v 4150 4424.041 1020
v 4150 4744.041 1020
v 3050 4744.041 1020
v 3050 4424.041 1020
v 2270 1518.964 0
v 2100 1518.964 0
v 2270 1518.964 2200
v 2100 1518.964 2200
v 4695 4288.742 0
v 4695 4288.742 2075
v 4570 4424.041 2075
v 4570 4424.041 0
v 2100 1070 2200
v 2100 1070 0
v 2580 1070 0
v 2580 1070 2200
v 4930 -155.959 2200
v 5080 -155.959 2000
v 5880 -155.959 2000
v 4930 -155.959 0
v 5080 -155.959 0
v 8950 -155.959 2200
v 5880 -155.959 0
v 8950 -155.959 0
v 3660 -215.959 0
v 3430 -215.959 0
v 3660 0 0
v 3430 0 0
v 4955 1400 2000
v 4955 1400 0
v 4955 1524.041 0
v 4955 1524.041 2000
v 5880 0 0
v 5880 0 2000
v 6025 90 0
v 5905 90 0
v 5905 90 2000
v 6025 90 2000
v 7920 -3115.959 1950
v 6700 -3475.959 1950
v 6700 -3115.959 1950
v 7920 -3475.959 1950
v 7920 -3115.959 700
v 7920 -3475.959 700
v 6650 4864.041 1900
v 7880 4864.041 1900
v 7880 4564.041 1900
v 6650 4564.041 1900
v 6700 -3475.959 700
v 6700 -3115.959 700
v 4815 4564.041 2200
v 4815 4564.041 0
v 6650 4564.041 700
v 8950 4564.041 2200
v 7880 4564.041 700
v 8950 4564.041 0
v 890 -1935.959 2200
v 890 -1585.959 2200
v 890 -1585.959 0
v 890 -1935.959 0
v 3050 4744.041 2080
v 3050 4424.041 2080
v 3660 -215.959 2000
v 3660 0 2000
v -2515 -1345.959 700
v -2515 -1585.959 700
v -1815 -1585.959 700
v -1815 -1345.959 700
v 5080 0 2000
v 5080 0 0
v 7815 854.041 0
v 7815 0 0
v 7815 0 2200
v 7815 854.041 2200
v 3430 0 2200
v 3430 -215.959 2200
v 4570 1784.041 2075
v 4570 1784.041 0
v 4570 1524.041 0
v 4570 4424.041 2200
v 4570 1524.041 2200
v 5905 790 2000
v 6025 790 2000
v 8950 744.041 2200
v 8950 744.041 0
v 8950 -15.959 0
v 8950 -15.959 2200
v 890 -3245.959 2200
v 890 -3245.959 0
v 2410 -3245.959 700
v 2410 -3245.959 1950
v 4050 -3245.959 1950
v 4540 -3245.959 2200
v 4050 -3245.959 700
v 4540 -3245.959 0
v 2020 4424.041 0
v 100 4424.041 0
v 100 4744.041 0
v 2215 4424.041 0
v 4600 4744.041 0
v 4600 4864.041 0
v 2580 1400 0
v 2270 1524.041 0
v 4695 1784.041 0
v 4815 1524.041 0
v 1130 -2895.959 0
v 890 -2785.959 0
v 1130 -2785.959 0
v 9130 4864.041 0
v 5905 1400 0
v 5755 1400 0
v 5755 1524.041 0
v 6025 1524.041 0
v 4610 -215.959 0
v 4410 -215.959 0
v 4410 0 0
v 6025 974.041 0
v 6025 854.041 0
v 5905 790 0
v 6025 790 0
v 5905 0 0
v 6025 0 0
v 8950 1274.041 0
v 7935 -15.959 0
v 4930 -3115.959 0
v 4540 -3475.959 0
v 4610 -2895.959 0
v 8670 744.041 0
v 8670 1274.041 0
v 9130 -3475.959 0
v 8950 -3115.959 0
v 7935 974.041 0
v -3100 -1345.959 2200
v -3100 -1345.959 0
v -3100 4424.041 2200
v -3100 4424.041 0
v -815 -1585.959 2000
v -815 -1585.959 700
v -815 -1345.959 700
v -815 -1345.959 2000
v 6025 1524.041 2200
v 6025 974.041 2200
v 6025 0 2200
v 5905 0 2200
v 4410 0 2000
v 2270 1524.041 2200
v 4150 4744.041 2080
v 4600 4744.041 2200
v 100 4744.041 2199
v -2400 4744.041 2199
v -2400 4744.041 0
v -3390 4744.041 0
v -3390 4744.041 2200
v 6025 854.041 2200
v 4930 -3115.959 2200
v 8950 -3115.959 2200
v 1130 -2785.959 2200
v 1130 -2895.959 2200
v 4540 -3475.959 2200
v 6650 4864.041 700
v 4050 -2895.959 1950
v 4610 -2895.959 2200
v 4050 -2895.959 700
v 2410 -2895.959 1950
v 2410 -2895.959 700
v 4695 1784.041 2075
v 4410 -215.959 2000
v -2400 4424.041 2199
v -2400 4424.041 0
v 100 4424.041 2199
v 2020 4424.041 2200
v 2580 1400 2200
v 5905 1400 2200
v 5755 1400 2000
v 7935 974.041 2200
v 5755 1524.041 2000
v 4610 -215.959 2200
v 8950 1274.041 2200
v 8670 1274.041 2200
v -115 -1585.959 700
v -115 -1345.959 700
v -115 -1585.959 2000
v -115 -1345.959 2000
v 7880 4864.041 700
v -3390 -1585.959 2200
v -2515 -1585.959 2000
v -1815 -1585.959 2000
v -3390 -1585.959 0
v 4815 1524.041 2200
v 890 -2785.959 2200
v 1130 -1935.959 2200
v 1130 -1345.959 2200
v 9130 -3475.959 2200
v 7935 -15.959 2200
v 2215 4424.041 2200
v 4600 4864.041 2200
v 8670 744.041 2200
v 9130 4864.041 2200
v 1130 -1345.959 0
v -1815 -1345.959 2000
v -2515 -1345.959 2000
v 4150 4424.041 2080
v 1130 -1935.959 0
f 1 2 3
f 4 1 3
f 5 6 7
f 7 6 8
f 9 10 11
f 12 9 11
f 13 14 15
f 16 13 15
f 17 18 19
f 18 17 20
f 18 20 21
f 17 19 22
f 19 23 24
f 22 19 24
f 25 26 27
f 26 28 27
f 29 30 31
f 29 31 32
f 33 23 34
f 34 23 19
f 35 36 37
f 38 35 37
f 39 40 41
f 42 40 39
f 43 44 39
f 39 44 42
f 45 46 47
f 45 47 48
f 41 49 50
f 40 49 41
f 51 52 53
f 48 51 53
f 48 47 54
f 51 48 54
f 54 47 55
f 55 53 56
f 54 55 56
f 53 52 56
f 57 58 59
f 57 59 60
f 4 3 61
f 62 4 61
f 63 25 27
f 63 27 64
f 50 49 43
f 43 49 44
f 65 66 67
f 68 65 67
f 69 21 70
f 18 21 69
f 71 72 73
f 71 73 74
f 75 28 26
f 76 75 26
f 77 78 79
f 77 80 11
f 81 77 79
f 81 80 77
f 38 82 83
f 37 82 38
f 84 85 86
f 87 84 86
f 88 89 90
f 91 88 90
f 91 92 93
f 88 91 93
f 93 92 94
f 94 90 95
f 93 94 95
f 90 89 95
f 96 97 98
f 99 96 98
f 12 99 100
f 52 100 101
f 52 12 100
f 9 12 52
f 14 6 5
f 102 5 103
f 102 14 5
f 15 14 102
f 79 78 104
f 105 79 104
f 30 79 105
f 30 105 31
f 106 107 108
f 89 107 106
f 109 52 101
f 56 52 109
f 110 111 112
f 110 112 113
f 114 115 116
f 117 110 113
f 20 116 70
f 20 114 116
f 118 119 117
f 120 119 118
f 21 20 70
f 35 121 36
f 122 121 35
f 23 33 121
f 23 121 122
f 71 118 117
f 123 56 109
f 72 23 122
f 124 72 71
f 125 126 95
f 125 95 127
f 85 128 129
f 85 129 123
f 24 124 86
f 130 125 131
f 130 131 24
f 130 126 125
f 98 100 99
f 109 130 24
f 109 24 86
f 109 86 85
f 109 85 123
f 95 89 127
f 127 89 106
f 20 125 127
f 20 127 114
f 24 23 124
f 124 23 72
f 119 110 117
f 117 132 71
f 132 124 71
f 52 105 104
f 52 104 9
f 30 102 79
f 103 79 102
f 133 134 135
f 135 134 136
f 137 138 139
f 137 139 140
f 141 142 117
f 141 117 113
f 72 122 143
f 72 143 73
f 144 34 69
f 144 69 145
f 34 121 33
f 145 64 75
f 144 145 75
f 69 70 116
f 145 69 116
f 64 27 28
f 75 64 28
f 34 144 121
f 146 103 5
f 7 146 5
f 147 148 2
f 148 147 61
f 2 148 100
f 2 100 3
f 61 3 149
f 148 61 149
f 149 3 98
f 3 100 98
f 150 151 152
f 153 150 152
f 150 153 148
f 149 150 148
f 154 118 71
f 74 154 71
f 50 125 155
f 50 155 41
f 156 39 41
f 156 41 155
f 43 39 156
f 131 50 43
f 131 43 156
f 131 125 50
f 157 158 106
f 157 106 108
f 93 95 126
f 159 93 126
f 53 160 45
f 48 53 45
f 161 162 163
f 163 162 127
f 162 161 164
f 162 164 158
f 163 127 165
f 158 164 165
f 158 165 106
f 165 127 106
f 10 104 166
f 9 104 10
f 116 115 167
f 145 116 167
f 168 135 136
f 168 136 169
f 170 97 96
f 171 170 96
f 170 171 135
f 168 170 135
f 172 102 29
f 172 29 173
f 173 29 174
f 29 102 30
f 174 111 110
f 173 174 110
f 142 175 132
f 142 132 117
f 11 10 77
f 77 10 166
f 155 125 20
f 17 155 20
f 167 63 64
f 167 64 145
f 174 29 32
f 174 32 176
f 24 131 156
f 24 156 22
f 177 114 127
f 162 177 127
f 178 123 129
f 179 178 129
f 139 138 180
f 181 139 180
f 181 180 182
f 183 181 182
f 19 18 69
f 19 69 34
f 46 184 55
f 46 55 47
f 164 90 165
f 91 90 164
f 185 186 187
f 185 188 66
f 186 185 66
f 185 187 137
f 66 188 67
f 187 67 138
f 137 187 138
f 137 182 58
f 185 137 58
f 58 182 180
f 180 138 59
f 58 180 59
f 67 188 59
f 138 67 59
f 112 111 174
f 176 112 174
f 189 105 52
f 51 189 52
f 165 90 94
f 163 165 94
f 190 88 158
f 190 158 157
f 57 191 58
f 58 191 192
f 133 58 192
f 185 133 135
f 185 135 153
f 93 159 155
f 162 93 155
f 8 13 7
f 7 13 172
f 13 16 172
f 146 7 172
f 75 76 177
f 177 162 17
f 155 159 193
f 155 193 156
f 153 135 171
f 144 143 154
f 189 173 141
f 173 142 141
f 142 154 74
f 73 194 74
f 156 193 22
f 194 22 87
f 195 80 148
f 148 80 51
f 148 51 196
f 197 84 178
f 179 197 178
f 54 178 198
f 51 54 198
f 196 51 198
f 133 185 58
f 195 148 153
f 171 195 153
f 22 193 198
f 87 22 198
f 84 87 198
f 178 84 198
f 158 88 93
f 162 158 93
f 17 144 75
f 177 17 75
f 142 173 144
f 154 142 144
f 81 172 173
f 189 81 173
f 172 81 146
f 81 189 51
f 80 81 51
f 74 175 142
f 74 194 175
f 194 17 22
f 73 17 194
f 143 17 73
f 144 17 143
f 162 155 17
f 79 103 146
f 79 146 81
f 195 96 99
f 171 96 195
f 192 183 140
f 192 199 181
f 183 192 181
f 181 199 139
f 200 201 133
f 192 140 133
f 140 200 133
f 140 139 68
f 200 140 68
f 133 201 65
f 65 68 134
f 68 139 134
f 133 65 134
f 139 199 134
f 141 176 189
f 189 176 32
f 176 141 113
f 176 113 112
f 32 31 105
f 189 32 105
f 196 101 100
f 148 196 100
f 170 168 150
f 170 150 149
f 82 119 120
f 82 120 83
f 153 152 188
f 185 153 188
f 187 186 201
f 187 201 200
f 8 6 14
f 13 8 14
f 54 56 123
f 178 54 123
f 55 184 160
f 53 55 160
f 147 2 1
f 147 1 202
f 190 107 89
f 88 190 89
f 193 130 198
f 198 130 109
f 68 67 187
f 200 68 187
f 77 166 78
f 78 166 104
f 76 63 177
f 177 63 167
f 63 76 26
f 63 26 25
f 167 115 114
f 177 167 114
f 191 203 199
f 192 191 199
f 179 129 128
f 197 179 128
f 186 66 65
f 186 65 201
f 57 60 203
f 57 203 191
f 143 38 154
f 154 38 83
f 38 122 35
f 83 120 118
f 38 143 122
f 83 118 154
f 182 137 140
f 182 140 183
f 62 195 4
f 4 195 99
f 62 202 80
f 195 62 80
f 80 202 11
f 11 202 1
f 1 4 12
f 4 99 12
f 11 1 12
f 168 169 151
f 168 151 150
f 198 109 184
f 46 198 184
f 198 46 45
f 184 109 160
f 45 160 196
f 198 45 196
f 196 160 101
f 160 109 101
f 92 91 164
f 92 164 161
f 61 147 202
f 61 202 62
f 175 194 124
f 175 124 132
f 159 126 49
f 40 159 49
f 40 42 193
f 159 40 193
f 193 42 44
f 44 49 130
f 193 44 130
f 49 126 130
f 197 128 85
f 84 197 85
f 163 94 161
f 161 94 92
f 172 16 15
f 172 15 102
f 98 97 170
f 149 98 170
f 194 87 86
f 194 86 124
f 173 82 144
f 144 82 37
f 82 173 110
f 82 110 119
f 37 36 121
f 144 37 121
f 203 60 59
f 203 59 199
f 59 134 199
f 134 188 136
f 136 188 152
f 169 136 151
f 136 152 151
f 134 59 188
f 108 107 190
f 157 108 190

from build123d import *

# Parameters (mm, degrees)
F0_W      = 4020
F0_H      = 2960
F0_W_2    = 1790
F0_H_2    = 854.041485
F0_W_3    = 2480
F0_H_3    = 2900
F1_DEPTH  = 2200
F2_W      = 2500
F2_H      = 2199
F3_DEPTH  = 350
F4_W      = 2905.077265
F4_H      = 2200
F5_DEPTH  = 250
F6_W      = 990
F6_H      = 2200
F7_DEPTH  = 130
F8_W      = 750
F8_H      = 2000
F9_DEPTH  = 250
F10_W     = 800
F10_H     = 2000
F11_DEPTH = 200
F12_W     = 800
F12_H     = 2000
F13_DEPTH = 200
F14_W     = 700
F14_H     = 1300
F15_DEPTH = 240
F16_W     = 1640
F16_H     = 1250
F17_DEPTH = 350
F18_W     = 1220
F18_H     = 1250
F19_DEPTH = 360
F20_W     = 1230
F20_H     = 1200
F21_DEPTH = 300
F22_W     = 1100
F22_H     = 1060
F23_DEPTH = 320
F24_W     = 850
F24_H     = 2200
F25_DEPTH = 240
F26_W     = 700
F26_H     = 2000
F27_DEPTH = 120
F29_DEPTH = 125
F31_DEPTH = 2075


with BuildPart() as f1:
    # F0 (on Top) → F1 (new body)
    with BuildSketch(Plane.XY):
        Polygon((-3390, -1585.958515), (890, -1585.958515), (890, -3245.958515), (4540, -3245.958515), (4540, -3475.958515), (9130, -3475.958515), (9130, 4864.041485), (4600, 4864.041485), (4600, 4744.041485), (-3390, 4744.041485), align=None)
        with Locations((6940, -1635.958515)):
            Rectangle(F0_W, F0_H, mode=Mode.SUBTRACT)
        with Locations((6920, 427.020742)):
            Rectangle(F0_W_2, F0_H_2, mode=Mode.SUBTRACT)
        Polygon((4610, -215.958515), (4610, -2895.958515), (1130, -2895.958515), (1130, -1345.958515), (-3100, -1345.958515), (-3100, 4424.041485), (2020, 4424.041485), (2020, 1518.96422), (1110, 1518.96422), (1110, 1399.993341), (2100, 1399.993341), (2100, 1070), (2580, 1070), (2580, 1400), (5905, 1400), (5905, 0), (3430, 0), (3430, -215.958515), align=None, mode=Mode.SUBTRACT)
        Polygon((4815, 1524.041485), (4815, 4564.041485), (8950, 4564.041485), (8950, 1274.041485), (8670, 1274.041485), (8670, 744.041485), (8950, 744.041485), (8950, -15.958515), (7935, -15.958515), (7935, 974.041485), (6025, 974.041485), (6025, 1524.041485), align=None, mode=Mode.SUBTRACT)
        with Locations((3455, 2974.041485)):
            Rectangle(F0_W_3, F0_H_3, mode=Mode.SUBTRACT)
    extrude(amount=F1_DEPTH)

    # F2 (on face) → F3 (cut)
    with BuildSketch(Plane.XZ.offset(-4424.041485)):
        with Locations((-1150, 1099.5)):
            Rectangle(F2_W, F2_H)
    extrude(amount=-F3_DEPTH, mode=Mode.SUBTRACT)

    # F4 (on face) → F5 (cut)
    with BuildSketch(Plane(origin=(2020, 0, 0), x_dir=(0, -1, 0), z_dir=(-1, 0, 0))):
        with Locations((-2971.502852, 1100)):
            Rectangle(F4_W, F4_H)
    extrude(amount=-F5_DEPTH, mode=Mode.SUBTRACT)

    # F6 (on face) → F7 (cut)
    with BuildSketch(Plane.XZ.offset(-1399.993341)):
        with Locations((1605, 1100)):
            Rectangle(F6_W, F6_H)
    extrude(amount=-F7_DEPTH, mode=Mode.SUBTRACT)

    # F8 (on face) → F9 (cut)
    with BuildSketch(Plane.XZ.offset(215.958515)):
        with Locations((4035, 1000)):
            Rectangle(F8_W, F8_H)
    extrude(amount=-F9_DEPTH, mode=Mode.SUBTRACT)

    # F10 (on face) → F11 (cut)
    with BuildSketch(Plane.XZ.offset(-1400)):
        with Locations((5355, 1000)):
            Rectangle(F10_W, F10_H)
    extrude(amount=-F11_DEPTH, mode=Mode.SUBTRACT)

    # F12 (on face) → F13 (cut)
    with BuildSketch(Plane.XZ.offset(155.958515)):
        with Locations((5480, 1000)):
            Rectangle(F12_W, F12_H)
    extrude(amount=-F13_DEPTH, mode=Mode.SUBTRACT)

    # F14 (on face) → F15 (cut, through all)
    with BuildSketch(Plane.XZ.offset(1585.958515)):
        with Locations((-2165, 1350)):
            Rectangle(F14_W, F14_H)
        with Locations((-465, 1350)):
            Rectangle(F14_W, F14_H)
    extrude(amount=-F15_DEPTH, mode=Mode.SUBTRACT)

    # F16 (on face) → F17 (cut, through all)
    with BuildSketch(Plane.XZ.offset(3245.958515)):
        with Locations((3230, 1325)):
            Rectangle(F16_W, F16_H)
    extrude(amount=-F17_DEPTH, mode=Mode.SUBTRACT)

    # F18 (on face) → F19 (cut, through all)
    with BuildSketch(Plane.XZ.offset(3475.958515)):
        with Locations((7310, 1325)):
            Rectangle(F18_W, F18_H)
    extrude(amount=-F19_DEPTH, mode=Mode.SUBTRACT)

    # F20 (on face) → F21 (cut, through all)
    with BuildSketch(Plane(origin=(0, 4864.041485, 0), x_dir=(-1, 0, 0), z_dir=(0, 1, 0))):
        with Locations((-7265, 1300)):
            Rectangle(F20_W, F20_H)
    extrude(amount=-F21_DEPTH, mode=Mode.SUBTRACT)

    # F22 (on face) → F23 (cut, through all)
    with BuildSketch(Plane(origin=(0, 4744.041485, 0), x_dir=(-1, 0, 0), z_dir=(0, 1, 0))):
        with Locations((-3600, 1550)):
            Rectangle(F22_W, F22_H)
    extrude(amount=-F23_DEPTH, mode=Mode.SUBTRACT)

    # F24 (on face) → F25 (cut, through all)
    with BuildSketch(Plane(origin=(890, 0, 0), x_dir=(0, -1, 0), z_dir=(-1, 0, 0))):
        with Locations((2360.958515, 1100)):
            Rectangle(F24_W, F24_H)
    extrude(amount=-F25_DEPTH, mode=Mode.SUBTRACT)

    # F26 (on face) → F27 (cut, through all)
    with BuildSketch(Plane(origin=(5905, 0, 0), x_dir=(0, -1, 0), z_dir=(-1, 0, 0))):
        with Locations((-440, 1000)):
            Rectangle(F26_W, F26_H)
    extrude(amount=-F27_DEPTH, mode=Mode.SUBTRACT)

    # F28 (on face) → F29 (join)
    with BuildSketch(Plane(origin=(4695, 0, 0), x_dir=(0, -1, 0), z_dir=(-1, 0, 0))):
        Polygon((-1784.041485, 2075), (-1784.041485, 0), (-1524.041485, 0), (-1524.041485, 2200), (-4424.041485, 2200), (-4424.041485, 2075), align=None)
    extrude(amount=F29_DEPTH)

    # F30 (on face) → F31 (join)
    with BuildSketch(Plane(origin=(0, 0, 2075), x_dir=(1, 0, 0), z_dir=(0, 0, -1))):
        Polygon((4695, -4288.742065), (4570, -4424.041485), (4695, -4424.041485), align=None)
    extrude(amount=F31_DEPTH)


solid = f1.part
